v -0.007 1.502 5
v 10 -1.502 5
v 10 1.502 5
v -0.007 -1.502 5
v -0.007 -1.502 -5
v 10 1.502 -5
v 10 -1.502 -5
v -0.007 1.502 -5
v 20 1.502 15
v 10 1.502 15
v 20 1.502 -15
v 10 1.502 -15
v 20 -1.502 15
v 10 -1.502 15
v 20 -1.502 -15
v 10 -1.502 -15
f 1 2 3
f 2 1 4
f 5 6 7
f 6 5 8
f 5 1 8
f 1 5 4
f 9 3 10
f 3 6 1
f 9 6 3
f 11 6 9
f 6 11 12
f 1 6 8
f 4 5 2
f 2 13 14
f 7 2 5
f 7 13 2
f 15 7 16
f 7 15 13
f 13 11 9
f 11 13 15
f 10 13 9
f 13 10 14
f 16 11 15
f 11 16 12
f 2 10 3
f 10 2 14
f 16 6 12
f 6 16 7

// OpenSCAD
// file: measures.scad
/**
 * Pencil box configuration
 * All measures in millimeters
 */

// rendering parameters
$fn = 200;
nothing = 0.005;

// material to cut from
material_x = 350;
material_y = 180;
material_z = 3;

// total size of the box
box_x = 130;
box_y = 70;
box_z = 100;

// measures of the two half circles left and right
curvature_y = box_y;
curvature_x = curvature_y/2;

// measure of rectangle between half circles
rect_x = box_x - 2*curvature_x;
rect_y = box_y;

top_opening_inset = 5.7*material_z;

wall_z = box_z - 2*material_z;

// distance between wall and outer edge
wall_inset = material_z;

curve_radius = box_y/2 - wall_inset - material_z;
curve_length = curve_radius*PI;

// total wall length without anchor
wall_length = 2*rect_x + 2*curve_length;

// nose properties
nose_x = 2*material_z;
nose_z = material_z;

// anchor
anchor_width = 10;
anchor_height = 30;
anchor_length = 20;

// for preview
pillar_count = 20;
pillar_angle = 180 / (pillar_count-1);
pillar_width = 4;

part_spacing = 1;
// main file
/**
 * The anchor is the structure
 * on the back side of the box
 * which holds together the
 * two ends of the wall.
 */

include <measures.scad>;

module wall_anchor()
{
    // horizontal
    translate([
        anchor_length/2-nothing,
        0,
        0
        ])
    cube([
        anchor_length+nothing,
        material_z+nothing,
        anchor_width
        ], center=true);

    // vertical
    translate([
        +anchor_length-anchor_width/2,
        0,
        0
        ])
    cube([
        anchor_width,
        material_z+nothing,
        anchor_height
        ], center=true);
}

wall_anchor();
